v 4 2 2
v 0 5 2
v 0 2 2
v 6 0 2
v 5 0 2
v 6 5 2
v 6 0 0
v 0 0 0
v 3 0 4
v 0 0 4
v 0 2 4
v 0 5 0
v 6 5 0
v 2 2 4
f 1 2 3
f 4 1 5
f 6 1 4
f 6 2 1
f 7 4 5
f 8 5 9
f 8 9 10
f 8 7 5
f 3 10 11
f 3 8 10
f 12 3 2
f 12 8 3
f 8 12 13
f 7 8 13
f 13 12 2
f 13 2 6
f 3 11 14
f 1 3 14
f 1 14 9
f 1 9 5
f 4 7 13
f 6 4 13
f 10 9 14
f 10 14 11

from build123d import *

# Parameters (mm, degrees)
SKETCH1_W           = 6
SKETCH1_H           = 5
BOSS_EXTRUDE1_DEPTH = 2
BOSS_EXTRUDE2_DEPTH = 2
CUT_EXTRUDE1_DEPTH  = 10


with BuildPart() as part:
    # Sketch1 → Boss-Extrude1 (new body)
    with BuildSketch(Plane.XY):
        with Locations((3, 2.5)):
            Rectangle(SKETCH1_W, SKETCH1_H)
    extrude(amount=BOSS_EXTRUDE1_DEPTH)

    # Sketch2 → Boss-Extrude2 (add)
    with BuildSketch(Plane.XY.offset(2)):
        Polygon((0, 0), (0, 2), (4, 2), (6, 0), align=None)
    extrude(amount=BOSS_EXTRUDE2_DEPTH)

    # 3DSketch1 → Cut-Extrude1 (cut, along a direction that is not the sketch's normal)
    with BuildSketch(Plane(origin=(5, 0, 2), x_dir=(-0.727606875108999, 0.485071250072666, 0.485071250072666), z_dir=(0.6666666666666666, 0.3333333333333333, 0.6666666666666666))):
        Polygon((0, 0), (2.42535625, 1.45521375), (4.123105626, 0), (1.697749375, -1.45521375), align=None)
    extrude(amount=CUT_EXTRUDE1_DEPTH, dir=(1, 0, 0), mode=Mode.SUBTRACT)


solid = part.part
